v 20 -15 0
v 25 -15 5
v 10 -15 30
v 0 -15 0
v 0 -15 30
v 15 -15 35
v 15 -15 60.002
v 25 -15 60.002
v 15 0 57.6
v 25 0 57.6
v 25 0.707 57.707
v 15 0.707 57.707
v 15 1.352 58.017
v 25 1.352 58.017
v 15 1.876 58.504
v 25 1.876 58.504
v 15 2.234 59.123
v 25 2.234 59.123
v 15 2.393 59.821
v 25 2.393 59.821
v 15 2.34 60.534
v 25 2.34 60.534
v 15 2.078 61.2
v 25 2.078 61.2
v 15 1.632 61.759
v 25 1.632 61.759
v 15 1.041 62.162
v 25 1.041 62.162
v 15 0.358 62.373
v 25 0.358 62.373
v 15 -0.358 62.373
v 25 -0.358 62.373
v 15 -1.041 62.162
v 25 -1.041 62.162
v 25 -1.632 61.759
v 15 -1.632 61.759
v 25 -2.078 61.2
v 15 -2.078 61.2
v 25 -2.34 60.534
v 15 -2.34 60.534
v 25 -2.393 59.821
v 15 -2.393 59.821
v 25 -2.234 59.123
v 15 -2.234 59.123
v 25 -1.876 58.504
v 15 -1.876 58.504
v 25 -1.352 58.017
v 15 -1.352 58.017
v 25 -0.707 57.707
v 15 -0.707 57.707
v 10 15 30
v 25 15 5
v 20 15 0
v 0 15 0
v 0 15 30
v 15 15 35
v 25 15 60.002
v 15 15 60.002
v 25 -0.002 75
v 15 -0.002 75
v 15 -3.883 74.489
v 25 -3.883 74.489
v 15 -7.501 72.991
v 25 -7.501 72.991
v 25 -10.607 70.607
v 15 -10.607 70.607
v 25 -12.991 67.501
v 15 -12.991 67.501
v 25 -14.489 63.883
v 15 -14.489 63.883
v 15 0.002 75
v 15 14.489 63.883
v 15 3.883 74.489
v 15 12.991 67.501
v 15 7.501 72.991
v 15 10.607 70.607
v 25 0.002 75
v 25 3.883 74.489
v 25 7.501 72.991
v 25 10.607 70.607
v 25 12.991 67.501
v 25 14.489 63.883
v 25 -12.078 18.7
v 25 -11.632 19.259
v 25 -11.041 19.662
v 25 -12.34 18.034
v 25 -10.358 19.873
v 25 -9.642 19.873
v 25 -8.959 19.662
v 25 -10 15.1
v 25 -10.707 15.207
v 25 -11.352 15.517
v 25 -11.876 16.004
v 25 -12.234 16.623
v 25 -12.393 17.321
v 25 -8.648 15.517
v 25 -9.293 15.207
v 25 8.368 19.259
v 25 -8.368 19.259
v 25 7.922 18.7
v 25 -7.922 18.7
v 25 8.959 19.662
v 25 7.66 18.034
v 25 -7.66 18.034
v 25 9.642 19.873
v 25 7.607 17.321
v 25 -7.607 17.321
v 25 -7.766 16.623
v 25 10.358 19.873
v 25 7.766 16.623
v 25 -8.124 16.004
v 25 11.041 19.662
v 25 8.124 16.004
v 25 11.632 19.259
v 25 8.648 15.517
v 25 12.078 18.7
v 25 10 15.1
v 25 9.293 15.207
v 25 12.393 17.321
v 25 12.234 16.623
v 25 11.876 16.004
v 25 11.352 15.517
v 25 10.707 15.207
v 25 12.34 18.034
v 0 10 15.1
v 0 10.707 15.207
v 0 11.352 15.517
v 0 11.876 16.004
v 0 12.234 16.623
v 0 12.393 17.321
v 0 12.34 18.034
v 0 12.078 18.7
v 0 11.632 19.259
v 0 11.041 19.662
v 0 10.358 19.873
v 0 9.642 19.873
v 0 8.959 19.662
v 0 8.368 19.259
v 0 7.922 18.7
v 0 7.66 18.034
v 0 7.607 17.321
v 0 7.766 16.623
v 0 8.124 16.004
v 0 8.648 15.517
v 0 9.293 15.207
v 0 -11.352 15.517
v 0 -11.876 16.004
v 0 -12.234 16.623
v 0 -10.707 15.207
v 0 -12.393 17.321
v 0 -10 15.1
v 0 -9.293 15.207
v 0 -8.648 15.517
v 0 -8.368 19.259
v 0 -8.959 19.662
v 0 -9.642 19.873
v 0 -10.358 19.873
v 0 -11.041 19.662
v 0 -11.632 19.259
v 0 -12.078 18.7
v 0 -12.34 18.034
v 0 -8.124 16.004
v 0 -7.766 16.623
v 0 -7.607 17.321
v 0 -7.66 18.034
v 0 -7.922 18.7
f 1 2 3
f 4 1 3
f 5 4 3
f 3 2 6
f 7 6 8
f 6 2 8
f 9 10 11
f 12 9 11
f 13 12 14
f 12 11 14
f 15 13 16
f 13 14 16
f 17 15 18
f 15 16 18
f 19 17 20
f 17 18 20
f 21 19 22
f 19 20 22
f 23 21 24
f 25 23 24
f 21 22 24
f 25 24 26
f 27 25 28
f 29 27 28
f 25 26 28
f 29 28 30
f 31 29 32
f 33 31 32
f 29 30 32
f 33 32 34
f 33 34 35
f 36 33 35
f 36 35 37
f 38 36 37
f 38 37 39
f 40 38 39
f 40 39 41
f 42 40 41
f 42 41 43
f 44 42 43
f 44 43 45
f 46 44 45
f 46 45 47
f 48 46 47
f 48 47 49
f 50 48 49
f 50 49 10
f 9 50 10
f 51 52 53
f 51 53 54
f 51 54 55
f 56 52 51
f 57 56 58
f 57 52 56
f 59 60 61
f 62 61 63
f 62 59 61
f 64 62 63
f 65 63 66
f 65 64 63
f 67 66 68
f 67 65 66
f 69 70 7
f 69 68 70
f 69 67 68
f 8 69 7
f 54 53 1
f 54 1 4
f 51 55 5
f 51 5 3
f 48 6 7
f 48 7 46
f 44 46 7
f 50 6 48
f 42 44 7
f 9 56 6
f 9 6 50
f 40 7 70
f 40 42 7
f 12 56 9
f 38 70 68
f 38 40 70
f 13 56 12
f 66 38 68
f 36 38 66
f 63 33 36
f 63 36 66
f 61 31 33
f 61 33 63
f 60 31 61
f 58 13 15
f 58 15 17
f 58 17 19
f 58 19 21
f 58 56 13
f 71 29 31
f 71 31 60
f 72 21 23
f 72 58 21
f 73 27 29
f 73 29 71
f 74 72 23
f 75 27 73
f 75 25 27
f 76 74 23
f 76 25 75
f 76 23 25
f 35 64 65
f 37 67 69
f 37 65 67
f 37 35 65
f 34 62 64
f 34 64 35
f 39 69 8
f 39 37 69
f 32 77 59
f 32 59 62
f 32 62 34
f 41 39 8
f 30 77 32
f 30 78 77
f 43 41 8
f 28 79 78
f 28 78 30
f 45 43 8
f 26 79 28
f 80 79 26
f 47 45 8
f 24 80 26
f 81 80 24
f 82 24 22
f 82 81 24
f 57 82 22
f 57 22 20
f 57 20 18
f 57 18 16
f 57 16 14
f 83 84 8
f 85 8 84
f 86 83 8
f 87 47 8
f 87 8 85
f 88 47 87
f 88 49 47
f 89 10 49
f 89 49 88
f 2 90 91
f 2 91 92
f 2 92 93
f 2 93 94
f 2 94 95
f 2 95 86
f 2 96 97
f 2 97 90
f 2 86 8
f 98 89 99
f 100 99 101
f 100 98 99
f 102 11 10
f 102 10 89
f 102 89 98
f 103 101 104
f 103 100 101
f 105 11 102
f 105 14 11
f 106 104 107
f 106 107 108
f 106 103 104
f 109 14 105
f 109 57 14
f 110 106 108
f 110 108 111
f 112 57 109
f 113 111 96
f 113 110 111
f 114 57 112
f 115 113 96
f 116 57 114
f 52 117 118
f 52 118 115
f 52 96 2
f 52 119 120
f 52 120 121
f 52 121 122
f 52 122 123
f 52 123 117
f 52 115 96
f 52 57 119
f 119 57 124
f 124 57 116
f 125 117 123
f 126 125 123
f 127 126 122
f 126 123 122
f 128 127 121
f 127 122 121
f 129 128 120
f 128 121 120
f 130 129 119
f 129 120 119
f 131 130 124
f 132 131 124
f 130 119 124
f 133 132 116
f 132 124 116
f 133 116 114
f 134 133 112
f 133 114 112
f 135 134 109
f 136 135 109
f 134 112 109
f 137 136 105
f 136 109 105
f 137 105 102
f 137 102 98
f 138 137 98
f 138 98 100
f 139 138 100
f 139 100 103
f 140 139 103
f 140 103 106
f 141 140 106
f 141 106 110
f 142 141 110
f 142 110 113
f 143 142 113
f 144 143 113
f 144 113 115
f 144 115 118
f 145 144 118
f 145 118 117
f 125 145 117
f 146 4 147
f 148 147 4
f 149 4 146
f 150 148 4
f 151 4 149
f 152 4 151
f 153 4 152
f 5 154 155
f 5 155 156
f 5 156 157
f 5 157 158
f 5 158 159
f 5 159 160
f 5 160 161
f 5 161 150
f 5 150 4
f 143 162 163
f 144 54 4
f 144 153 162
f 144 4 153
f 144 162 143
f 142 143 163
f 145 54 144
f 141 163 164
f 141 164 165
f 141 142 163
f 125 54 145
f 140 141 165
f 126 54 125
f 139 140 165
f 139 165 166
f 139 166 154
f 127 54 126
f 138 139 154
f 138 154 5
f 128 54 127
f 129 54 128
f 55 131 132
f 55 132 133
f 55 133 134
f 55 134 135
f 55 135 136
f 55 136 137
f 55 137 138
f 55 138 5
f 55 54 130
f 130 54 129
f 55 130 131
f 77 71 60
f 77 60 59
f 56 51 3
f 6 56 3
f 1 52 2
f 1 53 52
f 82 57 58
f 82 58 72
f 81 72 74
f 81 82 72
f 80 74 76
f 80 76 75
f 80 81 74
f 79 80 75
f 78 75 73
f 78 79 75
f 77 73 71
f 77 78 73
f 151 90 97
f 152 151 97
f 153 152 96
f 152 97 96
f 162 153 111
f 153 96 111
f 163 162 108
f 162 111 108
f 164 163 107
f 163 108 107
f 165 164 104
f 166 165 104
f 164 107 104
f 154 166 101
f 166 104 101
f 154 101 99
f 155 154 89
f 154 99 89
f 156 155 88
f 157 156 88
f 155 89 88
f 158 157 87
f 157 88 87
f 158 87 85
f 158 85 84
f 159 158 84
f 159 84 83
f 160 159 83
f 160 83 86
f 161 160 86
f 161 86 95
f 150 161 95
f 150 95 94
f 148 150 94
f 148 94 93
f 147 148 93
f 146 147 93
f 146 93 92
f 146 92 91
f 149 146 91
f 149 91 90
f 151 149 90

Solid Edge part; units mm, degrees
sketch "Sketch1" plane through (0, 0, 0) normal (0, -1, 0) x (1, 0, 0)
  line L0 (0, 0) -> (0, 30)
  line L1 (0, 30) -> (15, 30)
  line L2 (15, 30) -> (15, 75)
  line L3 (15, 75) -> (25, 75)
  line L4 (25, 75) -> (25, 0)
  line L5 (25, 0) -> (0, 0)
  dimension "D1" = 30
  dimension "D2" = 25
  dimension "D3" = 15
  dimension "D4" = 75
extrude "Protrusion1" add sketch "Sketch1" along normal mid plane 30
fillet "Round_1" radius 15 2 edges at (20, -15, 75) (20, 15, 75)
chamfer "Chamfer_1" distance 5 angle 45 2 edges at (25, 0, 0) (15, 0, 30)
hole "Hole_1" at (25, -10, 17.5) direction (-1, 0, 0) diameter 4.8 end up to next
hole "Hole1" at (25, 10, 17.5) direction (-1, 0, 0) diameter 4.8 end up to next
hole "Hole_3" at (25, 0, 60) direction (-1, 0, 0) diameter 4.8 end up to next
properties material "Polyethylene, low density"
